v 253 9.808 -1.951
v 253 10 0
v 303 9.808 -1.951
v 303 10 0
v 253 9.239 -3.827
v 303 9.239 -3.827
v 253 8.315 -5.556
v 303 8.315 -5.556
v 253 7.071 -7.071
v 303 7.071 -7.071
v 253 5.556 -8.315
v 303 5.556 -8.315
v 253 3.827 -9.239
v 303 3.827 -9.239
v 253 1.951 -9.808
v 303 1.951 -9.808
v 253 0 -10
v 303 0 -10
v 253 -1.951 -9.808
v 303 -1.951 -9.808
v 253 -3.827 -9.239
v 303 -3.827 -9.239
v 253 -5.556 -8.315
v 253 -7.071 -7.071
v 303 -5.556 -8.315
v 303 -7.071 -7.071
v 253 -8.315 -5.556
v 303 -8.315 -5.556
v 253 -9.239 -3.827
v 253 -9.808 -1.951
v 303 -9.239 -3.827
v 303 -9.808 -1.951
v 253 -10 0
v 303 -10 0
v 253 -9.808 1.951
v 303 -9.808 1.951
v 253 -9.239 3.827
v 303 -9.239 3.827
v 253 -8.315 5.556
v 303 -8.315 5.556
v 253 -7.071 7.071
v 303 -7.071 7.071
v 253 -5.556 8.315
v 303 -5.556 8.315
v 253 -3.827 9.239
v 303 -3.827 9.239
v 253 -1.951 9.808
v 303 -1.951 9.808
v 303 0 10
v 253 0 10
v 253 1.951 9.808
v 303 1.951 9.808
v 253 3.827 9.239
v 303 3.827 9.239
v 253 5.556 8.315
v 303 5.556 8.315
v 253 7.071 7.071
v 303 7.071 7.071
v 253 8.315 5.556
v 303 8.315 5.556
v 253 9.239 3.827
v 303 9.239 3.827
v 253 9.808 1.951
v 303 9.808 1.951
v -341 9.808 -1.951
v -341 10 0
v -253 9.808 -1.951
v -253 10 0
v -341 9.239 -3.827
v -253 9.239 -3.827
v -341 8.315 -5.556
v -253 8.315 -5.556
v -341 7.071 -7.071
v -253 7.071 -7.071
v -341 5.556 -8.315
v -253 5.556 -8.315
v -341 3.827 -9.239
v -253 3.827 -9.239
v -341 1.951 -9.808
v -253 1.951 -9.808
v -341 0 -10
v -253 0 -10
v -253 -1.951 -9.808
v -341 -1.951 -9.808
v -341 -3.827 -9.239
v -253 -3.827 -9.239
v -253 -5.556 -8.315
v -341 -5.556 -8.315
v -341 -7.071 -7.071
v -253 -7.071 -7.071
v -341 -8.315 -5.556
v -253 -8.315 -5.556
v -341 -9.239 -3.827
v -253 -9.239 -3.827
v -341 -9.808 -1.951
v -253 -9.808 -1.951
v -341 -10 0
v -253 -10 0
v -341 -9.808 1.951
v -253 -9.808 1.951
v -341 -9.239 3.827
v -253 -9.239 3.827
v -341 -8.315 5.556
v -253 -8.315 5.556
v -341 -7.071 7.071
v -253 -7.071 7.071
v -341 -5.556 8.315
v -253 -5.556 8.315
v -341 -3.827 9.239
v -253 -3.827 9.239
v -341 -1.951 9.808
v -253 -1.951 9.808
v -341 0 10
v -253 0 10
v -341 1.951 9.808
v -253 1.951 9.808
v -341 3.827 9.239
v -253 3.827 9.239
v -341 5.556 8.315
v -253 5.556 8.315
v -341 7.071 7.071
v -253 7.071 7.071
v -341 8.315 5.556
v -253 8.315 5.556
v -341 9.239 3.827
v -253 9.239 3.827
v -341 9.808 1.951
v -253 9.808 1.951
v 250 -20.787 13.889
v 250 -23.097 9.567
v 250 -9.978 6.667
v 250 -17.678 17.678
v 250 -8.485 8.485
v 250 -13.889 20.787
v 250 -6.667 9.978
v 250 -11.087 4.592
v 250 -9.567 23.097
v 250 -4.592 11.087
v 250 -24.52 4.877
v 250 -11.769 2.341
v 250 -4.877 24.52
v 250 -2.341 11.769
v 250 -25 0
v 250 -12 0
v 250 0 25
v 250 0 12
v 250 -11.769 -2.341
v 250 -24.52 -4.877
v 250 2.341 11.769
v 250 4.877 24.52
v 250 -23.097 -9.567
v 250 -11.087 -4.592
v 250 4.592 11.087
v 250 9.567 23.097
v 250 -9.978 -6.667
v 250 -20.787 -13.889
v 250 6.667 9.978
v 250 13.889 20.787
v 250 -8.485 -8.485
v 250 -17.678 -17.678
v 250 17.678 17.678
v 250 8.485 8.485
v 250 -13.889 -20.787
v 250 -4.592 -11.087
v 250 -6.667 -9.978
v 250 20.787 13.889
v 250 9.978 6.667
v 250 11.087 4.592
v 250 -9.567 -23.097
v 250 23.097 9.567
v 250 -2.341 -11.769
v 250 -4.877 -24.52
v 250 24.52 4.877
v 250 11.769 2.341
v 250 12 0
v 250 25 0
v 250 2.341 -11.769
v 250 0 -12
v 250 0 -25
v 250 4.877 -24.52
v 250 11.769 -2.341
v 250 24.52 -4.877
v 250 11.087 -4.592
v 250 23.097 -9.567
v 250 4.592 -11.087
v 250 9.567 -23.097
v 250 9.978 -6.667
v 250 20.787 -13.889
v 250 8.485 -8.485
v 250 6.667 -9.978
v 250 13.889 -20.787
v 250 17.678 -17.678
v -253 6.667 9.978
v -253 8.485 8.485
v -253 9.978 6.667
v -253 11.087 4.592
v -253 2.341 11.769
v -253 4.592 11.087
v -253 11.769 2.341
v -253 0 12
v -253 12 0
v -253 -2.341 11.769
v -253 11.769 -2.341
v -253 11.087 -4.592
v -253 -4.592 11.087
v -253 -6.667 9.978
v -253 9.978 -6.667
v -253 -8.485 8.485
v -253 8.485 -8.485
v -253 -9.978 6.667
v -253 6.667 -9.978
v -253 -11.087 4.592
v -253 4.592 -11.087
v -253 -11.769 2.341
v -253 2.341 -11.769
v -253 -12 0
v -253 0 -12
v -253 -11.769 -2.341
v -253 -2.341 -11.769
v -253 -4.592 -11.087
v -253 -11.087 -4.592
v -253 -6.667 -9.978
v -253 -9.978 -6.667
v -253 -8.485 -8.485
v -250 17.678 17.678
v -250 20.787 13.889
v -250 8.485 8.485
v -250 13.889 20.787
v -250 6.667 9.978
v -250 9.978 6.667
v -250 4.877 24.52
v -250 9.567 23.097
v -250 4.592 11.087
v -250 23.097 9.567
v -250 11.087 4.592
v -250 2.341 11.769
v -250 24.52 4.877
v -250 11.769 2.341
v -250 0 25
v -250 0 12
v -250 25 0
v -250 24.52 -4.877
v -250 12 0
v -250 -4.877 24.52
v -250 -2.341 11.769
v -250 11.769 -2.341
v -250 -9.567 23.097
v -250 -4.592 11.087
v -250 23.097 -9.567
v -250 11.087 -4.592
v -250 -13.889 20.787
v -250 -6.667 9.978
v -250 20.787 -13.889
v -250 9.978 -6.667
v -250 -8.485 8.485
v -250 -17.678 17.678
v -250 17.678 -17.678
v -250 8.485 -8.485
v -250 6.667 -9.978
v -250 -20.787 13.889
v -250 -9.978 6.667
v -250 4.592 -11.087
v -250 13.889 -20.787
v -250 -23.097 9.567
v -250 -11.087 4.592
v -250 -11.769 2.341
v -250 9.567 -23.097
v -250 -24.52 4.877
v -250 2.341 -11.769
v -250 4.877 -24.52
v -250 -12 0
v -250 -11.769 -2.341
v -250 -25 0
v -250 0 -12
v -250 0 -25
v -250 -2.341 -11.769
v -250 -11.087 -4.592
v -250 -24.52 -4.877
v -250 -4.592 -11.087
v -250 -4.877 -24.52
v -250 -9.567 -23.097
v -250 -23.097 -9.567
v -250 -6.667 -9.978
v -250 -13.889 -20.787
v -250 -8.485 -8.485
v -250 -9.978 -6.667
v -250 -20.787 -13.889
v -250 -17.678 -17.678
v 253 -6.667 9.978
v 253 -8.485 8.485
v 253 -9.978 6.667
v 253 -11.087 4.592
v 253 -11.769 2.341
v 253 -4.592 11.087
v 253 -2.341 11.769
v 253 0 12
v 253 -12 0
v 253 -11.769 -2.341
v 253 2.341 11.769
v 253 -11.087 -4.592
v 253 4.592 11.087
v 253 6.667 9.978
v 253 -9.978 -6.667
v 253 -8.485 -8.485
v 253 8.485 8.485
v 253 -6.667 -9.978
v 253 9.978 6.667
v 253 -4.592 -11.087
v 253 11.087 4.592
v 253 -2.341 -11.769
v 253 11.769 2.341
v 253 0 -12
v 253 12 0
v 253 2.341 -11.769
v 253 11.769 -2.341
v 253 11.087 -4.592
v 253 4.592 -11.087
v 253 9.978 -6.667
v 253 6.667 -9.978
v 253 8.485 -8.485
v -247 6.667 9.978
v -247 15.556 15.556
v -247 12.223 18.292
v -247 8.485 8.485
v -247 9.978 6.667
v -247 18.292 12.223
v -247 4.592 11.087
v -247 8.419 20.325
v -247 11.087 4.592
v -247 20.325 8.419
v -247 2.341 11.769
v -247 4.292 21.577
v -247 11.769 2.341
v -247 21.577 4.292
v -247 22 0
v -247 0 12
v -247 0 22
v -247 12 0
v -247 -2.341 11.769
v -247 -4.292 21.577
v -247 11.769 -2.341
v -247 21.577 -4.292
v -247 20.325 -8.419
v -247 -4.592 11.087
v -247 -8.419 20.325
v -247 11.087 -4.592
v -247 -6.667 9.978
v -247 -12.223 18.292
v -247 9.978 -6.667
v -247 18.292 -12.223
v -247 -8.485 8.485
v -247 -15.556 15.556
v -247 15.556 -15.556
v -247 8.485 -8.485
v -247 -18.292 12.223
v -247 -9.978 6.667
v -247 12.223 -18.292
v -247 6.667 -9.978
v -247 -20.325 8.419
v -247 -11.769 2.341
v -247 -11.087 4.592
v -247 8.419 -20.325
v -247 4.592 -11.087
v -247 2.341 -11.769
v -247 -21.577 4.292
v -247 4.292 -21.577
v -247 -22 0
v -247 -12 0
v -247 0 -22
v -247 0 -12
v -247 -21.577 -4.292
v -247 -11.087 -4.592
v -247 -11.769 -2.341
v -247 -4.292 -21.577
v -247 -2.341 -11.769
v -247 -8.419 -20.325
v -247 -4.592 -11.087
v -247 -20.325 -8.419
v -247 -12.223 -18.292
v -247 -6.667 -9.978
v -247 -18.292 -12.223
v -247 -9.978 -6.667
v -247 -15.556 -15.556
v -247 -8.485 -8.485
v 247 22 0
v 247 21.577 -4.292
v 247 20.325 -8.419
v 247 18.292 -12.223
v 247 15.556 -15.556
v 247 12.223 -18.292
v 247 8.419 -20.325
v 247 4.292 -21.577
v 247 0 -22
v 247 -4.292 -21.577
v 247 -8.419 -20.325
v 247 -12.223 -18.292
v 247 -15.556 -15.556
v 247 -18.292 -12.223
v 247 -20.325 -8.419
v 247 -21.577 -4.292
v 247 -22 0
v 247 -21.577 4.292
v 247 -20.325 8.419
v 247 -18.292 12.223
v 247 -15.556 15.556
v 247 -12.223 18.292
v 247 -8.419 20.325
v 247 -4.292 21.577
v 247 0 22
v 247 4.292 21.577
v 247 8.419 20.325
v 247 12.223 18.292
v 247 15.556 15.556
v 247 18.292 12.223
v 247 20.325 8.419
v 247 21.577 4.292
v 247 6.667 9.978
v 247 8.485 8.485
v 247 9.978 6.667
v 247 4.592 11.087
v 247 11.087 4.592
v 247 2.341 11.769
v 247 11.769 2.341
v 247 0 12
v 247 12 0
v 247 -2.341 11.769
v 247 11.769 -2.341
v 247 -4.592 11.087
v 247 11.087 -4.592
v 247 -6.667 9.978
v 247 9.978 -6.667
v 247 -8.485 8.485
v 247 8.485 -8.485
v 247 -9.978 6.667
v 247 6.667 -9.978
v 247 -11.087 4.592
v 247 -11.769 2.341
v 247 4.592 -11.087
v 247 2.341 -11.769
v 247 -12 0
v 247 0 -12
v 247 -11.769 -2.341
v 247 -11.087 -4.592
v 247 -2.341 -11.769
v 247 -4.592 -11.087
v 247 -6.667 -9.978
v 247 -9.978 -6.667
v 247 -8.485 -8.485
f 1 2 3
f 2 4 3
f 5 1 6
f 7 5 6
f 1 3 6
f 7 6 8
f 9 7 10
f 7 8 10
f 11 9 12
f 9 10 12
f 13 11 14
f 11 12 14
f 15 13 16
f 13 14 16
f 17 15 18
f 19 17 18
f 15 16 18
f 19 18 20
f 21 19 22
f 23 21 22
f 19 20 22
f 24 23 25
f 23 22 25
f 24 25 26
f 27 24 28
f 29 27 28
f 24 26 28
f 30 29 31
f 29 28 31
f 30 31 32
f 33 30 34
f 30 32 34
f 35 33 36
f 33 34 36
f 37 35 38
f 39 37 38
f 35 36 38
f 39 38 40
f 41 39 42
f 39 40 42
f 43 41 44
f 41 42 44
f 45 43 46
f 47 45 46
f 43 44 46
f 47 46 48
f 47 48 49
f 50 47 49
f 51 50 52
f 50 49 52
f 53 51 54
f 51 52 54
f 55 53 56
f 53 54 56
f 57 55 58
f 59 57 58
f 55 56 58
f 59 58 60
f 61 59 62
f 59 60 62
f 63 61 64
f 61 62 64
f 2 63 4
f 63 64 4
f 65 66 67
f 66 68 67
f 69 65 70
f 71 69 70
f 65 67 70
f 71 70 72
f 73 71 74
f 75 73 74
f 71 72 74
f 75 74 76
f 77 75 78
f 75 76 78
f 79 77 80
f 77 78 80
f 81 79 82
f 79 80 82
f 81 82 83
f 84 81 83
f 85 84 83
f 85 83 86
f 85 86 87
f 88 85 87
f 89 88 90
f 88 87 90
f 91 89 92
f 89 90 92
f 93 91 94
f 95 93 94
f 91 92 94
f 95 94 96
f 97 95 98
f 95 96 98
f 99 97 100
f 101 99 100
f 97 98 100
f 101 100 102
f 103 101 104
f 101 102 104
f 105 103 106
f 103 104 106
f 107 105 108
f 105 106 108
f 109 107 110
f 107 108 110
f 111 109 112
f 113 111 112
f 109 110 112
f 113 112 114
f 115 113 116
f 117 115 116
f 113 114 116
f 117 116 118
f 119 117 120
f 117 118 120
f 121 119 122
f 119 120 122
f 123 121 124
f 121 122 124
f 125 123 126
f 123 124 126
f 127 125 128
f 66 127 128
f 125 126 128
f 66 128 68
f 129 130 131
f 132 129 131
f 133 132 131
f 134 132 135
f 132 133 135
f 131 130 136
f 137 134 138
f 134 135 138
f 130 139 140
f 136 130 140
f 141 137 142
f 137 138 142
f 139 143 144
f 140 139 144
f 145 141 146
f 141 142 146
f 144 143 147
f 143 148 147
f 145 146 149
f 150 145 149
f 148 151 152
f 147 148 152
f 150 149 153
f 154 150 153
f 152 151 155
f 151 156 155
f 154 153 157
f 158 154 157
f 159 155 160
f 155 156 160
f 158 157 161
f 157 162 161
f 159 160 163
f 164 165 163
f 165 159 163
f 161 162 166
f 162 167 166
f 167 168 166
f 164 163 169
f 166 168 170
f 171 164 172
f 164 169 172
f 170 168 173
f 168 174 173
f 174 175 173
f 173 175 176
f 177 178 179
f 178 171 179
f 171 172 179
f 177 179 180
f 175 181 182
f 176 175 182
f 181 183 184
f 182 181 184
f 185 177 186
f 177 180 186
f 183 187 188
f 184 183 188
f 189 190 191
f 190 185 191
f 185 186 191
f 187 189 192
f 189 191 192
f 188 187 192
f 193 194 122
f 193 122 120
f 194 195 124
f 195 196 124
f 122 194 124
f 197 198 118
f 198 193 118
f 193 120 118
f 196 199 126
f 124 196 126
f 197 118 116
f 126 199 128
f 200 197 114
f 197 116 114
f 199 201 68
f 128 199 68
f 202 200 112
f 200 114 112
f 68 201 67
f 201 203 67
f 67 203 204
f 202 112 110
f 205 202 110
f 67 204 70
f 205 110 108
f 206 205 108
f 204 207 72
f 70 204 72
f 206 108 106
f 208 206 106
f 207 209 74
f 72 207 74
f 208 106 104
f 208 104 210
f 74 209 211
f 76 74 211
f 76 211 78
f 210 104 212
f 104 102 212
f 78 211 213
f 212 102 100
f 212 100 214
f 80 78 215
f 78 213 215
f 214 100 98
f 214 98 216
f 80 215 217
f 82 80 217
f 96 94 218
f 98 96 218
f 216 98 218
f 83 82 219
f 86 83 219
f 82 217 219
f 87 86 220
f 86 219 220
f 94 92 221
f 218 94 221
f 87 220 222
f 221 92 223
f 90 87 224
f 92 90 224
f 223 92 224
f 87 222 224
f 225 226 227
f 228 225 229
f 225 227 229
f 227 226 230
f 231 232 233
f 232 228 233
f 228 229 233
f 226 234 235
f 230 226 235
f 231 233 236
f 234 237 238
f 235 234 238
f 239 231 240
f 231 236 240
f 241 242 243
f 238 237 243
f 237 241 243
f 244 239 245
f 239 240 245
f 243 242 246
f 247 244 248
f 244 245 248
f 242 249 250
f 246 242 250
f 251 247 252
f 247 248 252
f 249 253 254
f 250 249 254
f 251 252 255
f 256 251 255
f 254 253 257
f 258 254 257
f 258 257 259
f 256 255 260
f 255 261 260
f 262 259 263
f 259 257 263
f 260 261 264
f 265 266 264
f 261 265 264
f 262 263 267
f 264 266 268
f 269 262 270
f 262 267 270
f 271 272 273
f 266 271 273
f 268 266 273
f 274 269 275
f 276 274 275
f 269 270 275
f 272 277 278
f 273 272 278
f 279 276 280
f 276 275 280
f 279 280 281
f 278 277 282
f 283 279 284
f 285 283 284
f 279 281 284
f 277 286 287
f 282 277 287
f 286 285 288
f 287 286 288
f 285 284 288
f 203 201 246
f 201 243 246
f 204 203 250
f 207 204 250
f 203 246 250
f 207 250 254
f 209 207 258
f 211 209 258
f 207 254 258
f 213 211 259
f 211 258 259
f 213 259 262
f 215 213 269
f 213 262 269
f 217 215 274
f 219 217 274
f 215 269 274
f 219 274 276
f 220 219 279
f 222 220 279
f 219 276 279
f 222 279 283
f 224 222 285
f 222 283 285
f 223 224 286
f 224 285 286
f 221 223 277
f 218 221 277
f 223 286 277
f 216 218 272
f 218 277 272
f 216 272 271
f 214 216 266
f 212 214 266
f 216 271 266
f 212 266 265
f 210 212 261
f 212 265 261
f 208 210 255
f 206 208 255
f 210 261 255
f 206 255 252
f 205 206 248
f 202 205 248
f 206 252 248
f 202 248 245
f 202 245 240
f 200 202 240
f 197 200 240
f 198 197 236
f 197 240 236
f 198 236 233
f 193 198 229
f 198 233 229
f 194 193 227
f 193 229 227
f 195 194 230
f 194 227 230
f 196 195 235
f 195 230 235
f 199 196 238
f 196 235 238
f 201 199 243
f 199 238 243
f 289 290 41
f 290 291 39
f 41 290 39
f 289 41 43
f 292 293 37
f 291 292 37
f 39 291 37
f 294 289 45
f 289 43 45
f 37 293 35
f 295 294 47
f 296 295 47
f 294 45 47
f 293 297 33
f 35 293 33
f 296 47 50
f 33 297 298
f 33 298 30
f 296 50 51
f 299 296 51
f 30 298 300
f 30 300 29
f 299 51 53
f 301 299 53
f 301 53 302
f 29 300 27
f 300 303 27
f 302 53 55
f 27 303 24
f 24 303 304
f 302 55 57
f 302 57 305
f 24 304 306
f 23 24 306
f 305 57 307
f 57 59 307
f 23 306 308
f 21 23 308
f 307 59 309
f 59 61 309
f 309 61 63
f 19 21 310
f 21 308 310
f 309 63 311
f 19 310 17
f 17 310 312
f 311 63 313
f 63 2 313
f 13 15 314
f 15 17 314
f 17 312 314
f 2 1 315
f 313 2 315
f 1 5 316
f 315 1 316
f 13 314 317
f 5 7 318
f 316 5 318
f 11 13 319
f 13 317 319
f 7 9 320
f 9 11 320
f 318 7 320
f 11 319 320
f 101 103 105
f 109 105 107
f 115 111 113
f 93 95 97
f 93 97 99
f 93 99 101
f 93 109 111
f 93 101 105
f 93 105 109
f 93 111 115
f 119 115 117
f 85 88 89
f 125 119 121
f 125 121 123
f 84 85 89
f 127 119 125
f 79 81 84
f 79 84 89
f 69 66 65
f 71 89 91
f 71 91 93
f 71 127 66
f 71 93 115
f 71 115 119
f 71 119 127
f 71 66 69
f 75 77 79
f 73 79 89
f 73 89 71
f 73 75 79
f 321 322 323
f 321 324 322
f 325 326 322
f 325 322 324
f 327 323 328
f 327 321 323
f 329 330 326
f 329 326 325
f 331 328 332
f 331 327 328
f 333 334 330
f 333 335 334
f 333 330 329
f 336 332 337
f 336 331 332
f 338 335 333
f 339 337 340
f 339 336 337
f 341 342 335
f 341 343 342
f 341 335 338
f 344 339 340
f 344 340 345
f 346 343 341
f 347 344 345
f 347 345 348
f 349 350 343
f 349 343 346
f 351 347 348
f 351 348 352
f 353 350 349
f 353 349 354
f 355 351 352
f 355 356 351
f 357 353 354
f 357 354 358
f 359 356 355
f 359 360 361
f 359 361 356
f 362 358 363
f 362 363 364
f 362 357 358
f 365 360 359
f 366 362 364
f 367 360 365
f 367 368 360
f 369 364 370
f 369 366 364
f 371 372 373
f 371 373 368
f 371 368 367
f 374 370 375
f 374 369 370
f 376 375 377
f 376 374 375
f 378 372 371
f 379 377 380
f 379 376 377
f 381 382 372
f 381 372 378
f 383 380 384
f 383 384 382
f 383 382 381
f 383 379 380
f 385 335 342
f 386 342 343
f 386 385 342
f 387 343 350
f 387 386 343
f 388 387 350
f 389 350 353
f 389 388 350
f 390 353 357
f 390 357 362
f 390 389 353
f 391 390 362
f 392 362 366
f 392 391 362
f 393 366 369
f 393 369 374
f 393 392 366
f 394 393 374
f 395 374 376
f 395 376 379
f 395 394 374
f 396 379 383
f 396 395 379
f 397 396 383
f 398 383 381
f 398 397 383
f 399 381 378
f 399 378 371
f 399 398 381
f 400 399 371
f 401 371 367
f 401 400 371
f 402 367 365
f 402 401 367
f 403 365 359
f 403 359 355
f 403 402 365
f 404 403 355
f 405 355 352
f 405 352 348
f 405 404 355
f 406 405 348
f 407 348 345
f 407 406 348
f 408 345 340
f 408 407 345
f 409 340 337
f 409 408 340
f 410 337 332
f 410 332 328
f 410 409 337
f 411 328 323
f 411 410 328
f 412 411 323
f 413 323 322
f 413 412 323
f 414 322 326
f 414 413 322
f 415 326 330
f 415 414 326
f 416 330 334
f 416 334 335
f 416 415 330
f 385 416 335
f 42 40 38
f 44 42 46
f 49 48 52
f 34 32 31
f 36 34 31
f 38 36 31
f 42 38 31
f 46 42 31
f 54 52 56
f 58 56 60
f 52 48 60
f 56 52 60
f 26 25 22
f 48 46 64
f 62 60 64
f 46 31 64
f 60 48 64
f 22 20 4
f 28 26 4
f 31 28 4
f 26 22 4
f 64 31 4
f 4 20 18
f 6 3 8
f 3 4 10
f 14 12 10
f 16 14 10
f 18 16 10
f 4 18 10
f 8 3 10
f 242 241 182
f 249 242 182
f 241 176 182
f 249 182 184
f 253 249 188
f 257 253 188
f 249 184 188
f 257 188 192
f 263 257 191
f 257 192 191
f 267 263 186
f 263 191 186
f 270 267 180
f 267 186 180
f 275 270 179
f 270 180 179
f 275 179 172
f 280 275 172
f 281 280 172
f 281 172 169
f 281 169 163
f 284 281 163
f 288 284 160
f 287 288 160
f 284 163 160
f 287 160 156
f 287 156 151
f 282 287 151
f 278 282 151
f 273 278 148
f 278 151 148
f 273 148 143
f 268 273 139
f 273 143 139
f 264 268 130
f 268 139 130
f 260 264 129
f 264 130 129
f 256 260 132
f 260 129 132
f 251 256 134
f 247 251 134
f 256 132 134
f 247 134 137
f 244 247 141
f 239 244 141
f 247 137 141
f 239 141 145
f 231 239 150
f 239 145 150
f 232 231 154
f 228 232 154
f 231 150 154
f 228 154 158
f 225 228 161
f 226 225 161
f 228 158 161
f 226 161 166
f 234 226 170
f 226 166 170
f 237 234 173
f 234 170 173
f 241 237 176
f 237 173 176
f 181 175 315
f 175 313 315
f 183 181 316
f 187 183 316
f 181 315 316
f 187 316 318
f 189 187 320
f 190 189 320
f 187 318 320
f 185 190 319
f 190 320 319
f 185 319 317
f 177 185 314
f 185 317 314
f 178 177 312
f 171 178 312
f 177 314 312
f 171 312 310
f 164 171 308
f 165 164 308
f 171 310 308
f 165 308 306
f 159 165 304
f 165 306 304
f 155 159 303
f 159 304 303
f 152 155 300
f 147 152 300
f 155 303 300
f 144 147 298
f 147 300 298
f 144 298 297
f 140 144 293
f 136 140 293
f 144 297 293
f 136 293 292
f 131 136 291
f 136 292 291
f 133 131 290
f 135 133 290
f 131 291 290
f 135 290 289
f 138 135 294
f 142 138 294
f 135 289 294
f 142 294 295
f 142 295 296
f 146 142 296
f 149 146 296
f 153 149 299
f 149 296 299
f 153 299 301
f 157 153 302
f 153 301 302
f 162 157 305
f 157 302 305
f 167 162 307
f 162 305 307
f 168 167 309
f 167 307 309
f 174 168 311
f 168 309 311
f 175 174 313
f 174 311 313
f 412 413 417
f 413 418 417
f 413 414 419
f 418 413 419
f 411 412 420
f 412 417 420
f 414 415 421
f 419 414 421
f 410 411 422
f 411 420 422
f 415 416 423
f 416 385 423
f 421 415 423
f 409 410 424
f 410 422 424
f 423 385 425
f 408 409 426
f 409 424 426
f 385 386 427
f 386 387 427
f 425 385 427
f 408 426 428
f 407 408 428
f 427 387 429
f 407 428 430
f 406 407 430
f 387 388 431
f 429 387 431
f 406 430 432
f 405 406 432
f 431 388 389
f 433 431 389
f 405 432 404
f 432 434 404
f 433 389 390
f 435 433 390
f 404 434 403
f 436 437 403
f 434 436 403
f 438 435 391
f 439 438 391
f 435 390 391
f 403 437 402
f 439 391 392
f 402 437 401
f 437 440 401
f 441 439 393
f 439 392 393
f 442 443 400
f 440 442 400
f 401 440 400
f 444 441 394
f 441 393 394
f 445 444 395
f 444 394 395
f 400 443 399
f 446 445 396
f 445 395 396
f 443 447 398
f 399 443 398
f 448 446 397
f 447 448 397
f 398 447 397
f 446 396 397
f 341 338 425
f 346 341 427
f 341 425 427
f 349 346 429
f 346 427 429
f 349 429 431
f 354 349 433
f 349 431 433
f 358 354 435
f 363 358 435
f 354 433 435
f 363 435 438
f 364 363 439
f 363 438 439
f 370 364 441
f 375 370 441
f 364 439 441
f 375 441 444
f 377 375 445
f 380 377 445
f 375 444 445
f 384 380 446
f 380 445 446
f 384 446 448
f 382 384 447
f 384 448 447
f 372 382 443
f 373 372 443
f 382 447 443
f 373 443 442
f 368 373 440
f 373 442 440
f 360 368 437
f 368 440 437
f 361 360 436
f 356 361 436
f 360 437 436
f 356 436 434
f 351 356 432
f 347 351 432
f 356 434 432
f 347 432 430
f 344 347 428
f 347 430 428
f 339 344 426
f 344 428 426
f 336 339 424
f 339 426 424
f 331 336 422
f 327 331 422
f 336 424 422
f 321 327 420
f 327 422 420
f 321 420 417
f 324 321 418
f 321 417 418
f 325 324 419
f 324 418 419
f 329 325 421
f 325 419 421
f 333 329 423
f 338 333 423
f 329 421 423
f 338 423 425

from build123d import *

# Parameters (mm, degrees)
SKETCH_1_W      = 494
SKETCH_1_H      = 10
SKETCH_2_R      = 10
EXTRUDE_1_DEPTH = 76


with BuildPart() as part:
    # 草图1 → 旋转1 (revolve)
    with BuildSketch(Plane.XY):
        Polygon((-265, 0), (-265, 10), (-253, 10), (-253, 12), (-250, 12), (-250, 25), (250, 25), (250, 12), (253, 12), (253, 10), (303, 10), (303, 0), align=None)
        with Locations((0, 17)):
            Rectangle(SKETCH_1_W, SKETCH_1_H, mode=Mode.SUBTRACT)
    revolve(axis=Axis((303, 0, 0), (-1, 0, 0)))

    # 草图2 → 凸台-拉伸1 (add)
    with BuildSketch(Plane.ZY.offset(265)):
        with Locations(Location((0, 0, 0), (0, 0, 90))):
            Circle(SKETCH_2_R)
    extrude(amount=EXTRUDE_1_DEPTH)


solid = part.part
